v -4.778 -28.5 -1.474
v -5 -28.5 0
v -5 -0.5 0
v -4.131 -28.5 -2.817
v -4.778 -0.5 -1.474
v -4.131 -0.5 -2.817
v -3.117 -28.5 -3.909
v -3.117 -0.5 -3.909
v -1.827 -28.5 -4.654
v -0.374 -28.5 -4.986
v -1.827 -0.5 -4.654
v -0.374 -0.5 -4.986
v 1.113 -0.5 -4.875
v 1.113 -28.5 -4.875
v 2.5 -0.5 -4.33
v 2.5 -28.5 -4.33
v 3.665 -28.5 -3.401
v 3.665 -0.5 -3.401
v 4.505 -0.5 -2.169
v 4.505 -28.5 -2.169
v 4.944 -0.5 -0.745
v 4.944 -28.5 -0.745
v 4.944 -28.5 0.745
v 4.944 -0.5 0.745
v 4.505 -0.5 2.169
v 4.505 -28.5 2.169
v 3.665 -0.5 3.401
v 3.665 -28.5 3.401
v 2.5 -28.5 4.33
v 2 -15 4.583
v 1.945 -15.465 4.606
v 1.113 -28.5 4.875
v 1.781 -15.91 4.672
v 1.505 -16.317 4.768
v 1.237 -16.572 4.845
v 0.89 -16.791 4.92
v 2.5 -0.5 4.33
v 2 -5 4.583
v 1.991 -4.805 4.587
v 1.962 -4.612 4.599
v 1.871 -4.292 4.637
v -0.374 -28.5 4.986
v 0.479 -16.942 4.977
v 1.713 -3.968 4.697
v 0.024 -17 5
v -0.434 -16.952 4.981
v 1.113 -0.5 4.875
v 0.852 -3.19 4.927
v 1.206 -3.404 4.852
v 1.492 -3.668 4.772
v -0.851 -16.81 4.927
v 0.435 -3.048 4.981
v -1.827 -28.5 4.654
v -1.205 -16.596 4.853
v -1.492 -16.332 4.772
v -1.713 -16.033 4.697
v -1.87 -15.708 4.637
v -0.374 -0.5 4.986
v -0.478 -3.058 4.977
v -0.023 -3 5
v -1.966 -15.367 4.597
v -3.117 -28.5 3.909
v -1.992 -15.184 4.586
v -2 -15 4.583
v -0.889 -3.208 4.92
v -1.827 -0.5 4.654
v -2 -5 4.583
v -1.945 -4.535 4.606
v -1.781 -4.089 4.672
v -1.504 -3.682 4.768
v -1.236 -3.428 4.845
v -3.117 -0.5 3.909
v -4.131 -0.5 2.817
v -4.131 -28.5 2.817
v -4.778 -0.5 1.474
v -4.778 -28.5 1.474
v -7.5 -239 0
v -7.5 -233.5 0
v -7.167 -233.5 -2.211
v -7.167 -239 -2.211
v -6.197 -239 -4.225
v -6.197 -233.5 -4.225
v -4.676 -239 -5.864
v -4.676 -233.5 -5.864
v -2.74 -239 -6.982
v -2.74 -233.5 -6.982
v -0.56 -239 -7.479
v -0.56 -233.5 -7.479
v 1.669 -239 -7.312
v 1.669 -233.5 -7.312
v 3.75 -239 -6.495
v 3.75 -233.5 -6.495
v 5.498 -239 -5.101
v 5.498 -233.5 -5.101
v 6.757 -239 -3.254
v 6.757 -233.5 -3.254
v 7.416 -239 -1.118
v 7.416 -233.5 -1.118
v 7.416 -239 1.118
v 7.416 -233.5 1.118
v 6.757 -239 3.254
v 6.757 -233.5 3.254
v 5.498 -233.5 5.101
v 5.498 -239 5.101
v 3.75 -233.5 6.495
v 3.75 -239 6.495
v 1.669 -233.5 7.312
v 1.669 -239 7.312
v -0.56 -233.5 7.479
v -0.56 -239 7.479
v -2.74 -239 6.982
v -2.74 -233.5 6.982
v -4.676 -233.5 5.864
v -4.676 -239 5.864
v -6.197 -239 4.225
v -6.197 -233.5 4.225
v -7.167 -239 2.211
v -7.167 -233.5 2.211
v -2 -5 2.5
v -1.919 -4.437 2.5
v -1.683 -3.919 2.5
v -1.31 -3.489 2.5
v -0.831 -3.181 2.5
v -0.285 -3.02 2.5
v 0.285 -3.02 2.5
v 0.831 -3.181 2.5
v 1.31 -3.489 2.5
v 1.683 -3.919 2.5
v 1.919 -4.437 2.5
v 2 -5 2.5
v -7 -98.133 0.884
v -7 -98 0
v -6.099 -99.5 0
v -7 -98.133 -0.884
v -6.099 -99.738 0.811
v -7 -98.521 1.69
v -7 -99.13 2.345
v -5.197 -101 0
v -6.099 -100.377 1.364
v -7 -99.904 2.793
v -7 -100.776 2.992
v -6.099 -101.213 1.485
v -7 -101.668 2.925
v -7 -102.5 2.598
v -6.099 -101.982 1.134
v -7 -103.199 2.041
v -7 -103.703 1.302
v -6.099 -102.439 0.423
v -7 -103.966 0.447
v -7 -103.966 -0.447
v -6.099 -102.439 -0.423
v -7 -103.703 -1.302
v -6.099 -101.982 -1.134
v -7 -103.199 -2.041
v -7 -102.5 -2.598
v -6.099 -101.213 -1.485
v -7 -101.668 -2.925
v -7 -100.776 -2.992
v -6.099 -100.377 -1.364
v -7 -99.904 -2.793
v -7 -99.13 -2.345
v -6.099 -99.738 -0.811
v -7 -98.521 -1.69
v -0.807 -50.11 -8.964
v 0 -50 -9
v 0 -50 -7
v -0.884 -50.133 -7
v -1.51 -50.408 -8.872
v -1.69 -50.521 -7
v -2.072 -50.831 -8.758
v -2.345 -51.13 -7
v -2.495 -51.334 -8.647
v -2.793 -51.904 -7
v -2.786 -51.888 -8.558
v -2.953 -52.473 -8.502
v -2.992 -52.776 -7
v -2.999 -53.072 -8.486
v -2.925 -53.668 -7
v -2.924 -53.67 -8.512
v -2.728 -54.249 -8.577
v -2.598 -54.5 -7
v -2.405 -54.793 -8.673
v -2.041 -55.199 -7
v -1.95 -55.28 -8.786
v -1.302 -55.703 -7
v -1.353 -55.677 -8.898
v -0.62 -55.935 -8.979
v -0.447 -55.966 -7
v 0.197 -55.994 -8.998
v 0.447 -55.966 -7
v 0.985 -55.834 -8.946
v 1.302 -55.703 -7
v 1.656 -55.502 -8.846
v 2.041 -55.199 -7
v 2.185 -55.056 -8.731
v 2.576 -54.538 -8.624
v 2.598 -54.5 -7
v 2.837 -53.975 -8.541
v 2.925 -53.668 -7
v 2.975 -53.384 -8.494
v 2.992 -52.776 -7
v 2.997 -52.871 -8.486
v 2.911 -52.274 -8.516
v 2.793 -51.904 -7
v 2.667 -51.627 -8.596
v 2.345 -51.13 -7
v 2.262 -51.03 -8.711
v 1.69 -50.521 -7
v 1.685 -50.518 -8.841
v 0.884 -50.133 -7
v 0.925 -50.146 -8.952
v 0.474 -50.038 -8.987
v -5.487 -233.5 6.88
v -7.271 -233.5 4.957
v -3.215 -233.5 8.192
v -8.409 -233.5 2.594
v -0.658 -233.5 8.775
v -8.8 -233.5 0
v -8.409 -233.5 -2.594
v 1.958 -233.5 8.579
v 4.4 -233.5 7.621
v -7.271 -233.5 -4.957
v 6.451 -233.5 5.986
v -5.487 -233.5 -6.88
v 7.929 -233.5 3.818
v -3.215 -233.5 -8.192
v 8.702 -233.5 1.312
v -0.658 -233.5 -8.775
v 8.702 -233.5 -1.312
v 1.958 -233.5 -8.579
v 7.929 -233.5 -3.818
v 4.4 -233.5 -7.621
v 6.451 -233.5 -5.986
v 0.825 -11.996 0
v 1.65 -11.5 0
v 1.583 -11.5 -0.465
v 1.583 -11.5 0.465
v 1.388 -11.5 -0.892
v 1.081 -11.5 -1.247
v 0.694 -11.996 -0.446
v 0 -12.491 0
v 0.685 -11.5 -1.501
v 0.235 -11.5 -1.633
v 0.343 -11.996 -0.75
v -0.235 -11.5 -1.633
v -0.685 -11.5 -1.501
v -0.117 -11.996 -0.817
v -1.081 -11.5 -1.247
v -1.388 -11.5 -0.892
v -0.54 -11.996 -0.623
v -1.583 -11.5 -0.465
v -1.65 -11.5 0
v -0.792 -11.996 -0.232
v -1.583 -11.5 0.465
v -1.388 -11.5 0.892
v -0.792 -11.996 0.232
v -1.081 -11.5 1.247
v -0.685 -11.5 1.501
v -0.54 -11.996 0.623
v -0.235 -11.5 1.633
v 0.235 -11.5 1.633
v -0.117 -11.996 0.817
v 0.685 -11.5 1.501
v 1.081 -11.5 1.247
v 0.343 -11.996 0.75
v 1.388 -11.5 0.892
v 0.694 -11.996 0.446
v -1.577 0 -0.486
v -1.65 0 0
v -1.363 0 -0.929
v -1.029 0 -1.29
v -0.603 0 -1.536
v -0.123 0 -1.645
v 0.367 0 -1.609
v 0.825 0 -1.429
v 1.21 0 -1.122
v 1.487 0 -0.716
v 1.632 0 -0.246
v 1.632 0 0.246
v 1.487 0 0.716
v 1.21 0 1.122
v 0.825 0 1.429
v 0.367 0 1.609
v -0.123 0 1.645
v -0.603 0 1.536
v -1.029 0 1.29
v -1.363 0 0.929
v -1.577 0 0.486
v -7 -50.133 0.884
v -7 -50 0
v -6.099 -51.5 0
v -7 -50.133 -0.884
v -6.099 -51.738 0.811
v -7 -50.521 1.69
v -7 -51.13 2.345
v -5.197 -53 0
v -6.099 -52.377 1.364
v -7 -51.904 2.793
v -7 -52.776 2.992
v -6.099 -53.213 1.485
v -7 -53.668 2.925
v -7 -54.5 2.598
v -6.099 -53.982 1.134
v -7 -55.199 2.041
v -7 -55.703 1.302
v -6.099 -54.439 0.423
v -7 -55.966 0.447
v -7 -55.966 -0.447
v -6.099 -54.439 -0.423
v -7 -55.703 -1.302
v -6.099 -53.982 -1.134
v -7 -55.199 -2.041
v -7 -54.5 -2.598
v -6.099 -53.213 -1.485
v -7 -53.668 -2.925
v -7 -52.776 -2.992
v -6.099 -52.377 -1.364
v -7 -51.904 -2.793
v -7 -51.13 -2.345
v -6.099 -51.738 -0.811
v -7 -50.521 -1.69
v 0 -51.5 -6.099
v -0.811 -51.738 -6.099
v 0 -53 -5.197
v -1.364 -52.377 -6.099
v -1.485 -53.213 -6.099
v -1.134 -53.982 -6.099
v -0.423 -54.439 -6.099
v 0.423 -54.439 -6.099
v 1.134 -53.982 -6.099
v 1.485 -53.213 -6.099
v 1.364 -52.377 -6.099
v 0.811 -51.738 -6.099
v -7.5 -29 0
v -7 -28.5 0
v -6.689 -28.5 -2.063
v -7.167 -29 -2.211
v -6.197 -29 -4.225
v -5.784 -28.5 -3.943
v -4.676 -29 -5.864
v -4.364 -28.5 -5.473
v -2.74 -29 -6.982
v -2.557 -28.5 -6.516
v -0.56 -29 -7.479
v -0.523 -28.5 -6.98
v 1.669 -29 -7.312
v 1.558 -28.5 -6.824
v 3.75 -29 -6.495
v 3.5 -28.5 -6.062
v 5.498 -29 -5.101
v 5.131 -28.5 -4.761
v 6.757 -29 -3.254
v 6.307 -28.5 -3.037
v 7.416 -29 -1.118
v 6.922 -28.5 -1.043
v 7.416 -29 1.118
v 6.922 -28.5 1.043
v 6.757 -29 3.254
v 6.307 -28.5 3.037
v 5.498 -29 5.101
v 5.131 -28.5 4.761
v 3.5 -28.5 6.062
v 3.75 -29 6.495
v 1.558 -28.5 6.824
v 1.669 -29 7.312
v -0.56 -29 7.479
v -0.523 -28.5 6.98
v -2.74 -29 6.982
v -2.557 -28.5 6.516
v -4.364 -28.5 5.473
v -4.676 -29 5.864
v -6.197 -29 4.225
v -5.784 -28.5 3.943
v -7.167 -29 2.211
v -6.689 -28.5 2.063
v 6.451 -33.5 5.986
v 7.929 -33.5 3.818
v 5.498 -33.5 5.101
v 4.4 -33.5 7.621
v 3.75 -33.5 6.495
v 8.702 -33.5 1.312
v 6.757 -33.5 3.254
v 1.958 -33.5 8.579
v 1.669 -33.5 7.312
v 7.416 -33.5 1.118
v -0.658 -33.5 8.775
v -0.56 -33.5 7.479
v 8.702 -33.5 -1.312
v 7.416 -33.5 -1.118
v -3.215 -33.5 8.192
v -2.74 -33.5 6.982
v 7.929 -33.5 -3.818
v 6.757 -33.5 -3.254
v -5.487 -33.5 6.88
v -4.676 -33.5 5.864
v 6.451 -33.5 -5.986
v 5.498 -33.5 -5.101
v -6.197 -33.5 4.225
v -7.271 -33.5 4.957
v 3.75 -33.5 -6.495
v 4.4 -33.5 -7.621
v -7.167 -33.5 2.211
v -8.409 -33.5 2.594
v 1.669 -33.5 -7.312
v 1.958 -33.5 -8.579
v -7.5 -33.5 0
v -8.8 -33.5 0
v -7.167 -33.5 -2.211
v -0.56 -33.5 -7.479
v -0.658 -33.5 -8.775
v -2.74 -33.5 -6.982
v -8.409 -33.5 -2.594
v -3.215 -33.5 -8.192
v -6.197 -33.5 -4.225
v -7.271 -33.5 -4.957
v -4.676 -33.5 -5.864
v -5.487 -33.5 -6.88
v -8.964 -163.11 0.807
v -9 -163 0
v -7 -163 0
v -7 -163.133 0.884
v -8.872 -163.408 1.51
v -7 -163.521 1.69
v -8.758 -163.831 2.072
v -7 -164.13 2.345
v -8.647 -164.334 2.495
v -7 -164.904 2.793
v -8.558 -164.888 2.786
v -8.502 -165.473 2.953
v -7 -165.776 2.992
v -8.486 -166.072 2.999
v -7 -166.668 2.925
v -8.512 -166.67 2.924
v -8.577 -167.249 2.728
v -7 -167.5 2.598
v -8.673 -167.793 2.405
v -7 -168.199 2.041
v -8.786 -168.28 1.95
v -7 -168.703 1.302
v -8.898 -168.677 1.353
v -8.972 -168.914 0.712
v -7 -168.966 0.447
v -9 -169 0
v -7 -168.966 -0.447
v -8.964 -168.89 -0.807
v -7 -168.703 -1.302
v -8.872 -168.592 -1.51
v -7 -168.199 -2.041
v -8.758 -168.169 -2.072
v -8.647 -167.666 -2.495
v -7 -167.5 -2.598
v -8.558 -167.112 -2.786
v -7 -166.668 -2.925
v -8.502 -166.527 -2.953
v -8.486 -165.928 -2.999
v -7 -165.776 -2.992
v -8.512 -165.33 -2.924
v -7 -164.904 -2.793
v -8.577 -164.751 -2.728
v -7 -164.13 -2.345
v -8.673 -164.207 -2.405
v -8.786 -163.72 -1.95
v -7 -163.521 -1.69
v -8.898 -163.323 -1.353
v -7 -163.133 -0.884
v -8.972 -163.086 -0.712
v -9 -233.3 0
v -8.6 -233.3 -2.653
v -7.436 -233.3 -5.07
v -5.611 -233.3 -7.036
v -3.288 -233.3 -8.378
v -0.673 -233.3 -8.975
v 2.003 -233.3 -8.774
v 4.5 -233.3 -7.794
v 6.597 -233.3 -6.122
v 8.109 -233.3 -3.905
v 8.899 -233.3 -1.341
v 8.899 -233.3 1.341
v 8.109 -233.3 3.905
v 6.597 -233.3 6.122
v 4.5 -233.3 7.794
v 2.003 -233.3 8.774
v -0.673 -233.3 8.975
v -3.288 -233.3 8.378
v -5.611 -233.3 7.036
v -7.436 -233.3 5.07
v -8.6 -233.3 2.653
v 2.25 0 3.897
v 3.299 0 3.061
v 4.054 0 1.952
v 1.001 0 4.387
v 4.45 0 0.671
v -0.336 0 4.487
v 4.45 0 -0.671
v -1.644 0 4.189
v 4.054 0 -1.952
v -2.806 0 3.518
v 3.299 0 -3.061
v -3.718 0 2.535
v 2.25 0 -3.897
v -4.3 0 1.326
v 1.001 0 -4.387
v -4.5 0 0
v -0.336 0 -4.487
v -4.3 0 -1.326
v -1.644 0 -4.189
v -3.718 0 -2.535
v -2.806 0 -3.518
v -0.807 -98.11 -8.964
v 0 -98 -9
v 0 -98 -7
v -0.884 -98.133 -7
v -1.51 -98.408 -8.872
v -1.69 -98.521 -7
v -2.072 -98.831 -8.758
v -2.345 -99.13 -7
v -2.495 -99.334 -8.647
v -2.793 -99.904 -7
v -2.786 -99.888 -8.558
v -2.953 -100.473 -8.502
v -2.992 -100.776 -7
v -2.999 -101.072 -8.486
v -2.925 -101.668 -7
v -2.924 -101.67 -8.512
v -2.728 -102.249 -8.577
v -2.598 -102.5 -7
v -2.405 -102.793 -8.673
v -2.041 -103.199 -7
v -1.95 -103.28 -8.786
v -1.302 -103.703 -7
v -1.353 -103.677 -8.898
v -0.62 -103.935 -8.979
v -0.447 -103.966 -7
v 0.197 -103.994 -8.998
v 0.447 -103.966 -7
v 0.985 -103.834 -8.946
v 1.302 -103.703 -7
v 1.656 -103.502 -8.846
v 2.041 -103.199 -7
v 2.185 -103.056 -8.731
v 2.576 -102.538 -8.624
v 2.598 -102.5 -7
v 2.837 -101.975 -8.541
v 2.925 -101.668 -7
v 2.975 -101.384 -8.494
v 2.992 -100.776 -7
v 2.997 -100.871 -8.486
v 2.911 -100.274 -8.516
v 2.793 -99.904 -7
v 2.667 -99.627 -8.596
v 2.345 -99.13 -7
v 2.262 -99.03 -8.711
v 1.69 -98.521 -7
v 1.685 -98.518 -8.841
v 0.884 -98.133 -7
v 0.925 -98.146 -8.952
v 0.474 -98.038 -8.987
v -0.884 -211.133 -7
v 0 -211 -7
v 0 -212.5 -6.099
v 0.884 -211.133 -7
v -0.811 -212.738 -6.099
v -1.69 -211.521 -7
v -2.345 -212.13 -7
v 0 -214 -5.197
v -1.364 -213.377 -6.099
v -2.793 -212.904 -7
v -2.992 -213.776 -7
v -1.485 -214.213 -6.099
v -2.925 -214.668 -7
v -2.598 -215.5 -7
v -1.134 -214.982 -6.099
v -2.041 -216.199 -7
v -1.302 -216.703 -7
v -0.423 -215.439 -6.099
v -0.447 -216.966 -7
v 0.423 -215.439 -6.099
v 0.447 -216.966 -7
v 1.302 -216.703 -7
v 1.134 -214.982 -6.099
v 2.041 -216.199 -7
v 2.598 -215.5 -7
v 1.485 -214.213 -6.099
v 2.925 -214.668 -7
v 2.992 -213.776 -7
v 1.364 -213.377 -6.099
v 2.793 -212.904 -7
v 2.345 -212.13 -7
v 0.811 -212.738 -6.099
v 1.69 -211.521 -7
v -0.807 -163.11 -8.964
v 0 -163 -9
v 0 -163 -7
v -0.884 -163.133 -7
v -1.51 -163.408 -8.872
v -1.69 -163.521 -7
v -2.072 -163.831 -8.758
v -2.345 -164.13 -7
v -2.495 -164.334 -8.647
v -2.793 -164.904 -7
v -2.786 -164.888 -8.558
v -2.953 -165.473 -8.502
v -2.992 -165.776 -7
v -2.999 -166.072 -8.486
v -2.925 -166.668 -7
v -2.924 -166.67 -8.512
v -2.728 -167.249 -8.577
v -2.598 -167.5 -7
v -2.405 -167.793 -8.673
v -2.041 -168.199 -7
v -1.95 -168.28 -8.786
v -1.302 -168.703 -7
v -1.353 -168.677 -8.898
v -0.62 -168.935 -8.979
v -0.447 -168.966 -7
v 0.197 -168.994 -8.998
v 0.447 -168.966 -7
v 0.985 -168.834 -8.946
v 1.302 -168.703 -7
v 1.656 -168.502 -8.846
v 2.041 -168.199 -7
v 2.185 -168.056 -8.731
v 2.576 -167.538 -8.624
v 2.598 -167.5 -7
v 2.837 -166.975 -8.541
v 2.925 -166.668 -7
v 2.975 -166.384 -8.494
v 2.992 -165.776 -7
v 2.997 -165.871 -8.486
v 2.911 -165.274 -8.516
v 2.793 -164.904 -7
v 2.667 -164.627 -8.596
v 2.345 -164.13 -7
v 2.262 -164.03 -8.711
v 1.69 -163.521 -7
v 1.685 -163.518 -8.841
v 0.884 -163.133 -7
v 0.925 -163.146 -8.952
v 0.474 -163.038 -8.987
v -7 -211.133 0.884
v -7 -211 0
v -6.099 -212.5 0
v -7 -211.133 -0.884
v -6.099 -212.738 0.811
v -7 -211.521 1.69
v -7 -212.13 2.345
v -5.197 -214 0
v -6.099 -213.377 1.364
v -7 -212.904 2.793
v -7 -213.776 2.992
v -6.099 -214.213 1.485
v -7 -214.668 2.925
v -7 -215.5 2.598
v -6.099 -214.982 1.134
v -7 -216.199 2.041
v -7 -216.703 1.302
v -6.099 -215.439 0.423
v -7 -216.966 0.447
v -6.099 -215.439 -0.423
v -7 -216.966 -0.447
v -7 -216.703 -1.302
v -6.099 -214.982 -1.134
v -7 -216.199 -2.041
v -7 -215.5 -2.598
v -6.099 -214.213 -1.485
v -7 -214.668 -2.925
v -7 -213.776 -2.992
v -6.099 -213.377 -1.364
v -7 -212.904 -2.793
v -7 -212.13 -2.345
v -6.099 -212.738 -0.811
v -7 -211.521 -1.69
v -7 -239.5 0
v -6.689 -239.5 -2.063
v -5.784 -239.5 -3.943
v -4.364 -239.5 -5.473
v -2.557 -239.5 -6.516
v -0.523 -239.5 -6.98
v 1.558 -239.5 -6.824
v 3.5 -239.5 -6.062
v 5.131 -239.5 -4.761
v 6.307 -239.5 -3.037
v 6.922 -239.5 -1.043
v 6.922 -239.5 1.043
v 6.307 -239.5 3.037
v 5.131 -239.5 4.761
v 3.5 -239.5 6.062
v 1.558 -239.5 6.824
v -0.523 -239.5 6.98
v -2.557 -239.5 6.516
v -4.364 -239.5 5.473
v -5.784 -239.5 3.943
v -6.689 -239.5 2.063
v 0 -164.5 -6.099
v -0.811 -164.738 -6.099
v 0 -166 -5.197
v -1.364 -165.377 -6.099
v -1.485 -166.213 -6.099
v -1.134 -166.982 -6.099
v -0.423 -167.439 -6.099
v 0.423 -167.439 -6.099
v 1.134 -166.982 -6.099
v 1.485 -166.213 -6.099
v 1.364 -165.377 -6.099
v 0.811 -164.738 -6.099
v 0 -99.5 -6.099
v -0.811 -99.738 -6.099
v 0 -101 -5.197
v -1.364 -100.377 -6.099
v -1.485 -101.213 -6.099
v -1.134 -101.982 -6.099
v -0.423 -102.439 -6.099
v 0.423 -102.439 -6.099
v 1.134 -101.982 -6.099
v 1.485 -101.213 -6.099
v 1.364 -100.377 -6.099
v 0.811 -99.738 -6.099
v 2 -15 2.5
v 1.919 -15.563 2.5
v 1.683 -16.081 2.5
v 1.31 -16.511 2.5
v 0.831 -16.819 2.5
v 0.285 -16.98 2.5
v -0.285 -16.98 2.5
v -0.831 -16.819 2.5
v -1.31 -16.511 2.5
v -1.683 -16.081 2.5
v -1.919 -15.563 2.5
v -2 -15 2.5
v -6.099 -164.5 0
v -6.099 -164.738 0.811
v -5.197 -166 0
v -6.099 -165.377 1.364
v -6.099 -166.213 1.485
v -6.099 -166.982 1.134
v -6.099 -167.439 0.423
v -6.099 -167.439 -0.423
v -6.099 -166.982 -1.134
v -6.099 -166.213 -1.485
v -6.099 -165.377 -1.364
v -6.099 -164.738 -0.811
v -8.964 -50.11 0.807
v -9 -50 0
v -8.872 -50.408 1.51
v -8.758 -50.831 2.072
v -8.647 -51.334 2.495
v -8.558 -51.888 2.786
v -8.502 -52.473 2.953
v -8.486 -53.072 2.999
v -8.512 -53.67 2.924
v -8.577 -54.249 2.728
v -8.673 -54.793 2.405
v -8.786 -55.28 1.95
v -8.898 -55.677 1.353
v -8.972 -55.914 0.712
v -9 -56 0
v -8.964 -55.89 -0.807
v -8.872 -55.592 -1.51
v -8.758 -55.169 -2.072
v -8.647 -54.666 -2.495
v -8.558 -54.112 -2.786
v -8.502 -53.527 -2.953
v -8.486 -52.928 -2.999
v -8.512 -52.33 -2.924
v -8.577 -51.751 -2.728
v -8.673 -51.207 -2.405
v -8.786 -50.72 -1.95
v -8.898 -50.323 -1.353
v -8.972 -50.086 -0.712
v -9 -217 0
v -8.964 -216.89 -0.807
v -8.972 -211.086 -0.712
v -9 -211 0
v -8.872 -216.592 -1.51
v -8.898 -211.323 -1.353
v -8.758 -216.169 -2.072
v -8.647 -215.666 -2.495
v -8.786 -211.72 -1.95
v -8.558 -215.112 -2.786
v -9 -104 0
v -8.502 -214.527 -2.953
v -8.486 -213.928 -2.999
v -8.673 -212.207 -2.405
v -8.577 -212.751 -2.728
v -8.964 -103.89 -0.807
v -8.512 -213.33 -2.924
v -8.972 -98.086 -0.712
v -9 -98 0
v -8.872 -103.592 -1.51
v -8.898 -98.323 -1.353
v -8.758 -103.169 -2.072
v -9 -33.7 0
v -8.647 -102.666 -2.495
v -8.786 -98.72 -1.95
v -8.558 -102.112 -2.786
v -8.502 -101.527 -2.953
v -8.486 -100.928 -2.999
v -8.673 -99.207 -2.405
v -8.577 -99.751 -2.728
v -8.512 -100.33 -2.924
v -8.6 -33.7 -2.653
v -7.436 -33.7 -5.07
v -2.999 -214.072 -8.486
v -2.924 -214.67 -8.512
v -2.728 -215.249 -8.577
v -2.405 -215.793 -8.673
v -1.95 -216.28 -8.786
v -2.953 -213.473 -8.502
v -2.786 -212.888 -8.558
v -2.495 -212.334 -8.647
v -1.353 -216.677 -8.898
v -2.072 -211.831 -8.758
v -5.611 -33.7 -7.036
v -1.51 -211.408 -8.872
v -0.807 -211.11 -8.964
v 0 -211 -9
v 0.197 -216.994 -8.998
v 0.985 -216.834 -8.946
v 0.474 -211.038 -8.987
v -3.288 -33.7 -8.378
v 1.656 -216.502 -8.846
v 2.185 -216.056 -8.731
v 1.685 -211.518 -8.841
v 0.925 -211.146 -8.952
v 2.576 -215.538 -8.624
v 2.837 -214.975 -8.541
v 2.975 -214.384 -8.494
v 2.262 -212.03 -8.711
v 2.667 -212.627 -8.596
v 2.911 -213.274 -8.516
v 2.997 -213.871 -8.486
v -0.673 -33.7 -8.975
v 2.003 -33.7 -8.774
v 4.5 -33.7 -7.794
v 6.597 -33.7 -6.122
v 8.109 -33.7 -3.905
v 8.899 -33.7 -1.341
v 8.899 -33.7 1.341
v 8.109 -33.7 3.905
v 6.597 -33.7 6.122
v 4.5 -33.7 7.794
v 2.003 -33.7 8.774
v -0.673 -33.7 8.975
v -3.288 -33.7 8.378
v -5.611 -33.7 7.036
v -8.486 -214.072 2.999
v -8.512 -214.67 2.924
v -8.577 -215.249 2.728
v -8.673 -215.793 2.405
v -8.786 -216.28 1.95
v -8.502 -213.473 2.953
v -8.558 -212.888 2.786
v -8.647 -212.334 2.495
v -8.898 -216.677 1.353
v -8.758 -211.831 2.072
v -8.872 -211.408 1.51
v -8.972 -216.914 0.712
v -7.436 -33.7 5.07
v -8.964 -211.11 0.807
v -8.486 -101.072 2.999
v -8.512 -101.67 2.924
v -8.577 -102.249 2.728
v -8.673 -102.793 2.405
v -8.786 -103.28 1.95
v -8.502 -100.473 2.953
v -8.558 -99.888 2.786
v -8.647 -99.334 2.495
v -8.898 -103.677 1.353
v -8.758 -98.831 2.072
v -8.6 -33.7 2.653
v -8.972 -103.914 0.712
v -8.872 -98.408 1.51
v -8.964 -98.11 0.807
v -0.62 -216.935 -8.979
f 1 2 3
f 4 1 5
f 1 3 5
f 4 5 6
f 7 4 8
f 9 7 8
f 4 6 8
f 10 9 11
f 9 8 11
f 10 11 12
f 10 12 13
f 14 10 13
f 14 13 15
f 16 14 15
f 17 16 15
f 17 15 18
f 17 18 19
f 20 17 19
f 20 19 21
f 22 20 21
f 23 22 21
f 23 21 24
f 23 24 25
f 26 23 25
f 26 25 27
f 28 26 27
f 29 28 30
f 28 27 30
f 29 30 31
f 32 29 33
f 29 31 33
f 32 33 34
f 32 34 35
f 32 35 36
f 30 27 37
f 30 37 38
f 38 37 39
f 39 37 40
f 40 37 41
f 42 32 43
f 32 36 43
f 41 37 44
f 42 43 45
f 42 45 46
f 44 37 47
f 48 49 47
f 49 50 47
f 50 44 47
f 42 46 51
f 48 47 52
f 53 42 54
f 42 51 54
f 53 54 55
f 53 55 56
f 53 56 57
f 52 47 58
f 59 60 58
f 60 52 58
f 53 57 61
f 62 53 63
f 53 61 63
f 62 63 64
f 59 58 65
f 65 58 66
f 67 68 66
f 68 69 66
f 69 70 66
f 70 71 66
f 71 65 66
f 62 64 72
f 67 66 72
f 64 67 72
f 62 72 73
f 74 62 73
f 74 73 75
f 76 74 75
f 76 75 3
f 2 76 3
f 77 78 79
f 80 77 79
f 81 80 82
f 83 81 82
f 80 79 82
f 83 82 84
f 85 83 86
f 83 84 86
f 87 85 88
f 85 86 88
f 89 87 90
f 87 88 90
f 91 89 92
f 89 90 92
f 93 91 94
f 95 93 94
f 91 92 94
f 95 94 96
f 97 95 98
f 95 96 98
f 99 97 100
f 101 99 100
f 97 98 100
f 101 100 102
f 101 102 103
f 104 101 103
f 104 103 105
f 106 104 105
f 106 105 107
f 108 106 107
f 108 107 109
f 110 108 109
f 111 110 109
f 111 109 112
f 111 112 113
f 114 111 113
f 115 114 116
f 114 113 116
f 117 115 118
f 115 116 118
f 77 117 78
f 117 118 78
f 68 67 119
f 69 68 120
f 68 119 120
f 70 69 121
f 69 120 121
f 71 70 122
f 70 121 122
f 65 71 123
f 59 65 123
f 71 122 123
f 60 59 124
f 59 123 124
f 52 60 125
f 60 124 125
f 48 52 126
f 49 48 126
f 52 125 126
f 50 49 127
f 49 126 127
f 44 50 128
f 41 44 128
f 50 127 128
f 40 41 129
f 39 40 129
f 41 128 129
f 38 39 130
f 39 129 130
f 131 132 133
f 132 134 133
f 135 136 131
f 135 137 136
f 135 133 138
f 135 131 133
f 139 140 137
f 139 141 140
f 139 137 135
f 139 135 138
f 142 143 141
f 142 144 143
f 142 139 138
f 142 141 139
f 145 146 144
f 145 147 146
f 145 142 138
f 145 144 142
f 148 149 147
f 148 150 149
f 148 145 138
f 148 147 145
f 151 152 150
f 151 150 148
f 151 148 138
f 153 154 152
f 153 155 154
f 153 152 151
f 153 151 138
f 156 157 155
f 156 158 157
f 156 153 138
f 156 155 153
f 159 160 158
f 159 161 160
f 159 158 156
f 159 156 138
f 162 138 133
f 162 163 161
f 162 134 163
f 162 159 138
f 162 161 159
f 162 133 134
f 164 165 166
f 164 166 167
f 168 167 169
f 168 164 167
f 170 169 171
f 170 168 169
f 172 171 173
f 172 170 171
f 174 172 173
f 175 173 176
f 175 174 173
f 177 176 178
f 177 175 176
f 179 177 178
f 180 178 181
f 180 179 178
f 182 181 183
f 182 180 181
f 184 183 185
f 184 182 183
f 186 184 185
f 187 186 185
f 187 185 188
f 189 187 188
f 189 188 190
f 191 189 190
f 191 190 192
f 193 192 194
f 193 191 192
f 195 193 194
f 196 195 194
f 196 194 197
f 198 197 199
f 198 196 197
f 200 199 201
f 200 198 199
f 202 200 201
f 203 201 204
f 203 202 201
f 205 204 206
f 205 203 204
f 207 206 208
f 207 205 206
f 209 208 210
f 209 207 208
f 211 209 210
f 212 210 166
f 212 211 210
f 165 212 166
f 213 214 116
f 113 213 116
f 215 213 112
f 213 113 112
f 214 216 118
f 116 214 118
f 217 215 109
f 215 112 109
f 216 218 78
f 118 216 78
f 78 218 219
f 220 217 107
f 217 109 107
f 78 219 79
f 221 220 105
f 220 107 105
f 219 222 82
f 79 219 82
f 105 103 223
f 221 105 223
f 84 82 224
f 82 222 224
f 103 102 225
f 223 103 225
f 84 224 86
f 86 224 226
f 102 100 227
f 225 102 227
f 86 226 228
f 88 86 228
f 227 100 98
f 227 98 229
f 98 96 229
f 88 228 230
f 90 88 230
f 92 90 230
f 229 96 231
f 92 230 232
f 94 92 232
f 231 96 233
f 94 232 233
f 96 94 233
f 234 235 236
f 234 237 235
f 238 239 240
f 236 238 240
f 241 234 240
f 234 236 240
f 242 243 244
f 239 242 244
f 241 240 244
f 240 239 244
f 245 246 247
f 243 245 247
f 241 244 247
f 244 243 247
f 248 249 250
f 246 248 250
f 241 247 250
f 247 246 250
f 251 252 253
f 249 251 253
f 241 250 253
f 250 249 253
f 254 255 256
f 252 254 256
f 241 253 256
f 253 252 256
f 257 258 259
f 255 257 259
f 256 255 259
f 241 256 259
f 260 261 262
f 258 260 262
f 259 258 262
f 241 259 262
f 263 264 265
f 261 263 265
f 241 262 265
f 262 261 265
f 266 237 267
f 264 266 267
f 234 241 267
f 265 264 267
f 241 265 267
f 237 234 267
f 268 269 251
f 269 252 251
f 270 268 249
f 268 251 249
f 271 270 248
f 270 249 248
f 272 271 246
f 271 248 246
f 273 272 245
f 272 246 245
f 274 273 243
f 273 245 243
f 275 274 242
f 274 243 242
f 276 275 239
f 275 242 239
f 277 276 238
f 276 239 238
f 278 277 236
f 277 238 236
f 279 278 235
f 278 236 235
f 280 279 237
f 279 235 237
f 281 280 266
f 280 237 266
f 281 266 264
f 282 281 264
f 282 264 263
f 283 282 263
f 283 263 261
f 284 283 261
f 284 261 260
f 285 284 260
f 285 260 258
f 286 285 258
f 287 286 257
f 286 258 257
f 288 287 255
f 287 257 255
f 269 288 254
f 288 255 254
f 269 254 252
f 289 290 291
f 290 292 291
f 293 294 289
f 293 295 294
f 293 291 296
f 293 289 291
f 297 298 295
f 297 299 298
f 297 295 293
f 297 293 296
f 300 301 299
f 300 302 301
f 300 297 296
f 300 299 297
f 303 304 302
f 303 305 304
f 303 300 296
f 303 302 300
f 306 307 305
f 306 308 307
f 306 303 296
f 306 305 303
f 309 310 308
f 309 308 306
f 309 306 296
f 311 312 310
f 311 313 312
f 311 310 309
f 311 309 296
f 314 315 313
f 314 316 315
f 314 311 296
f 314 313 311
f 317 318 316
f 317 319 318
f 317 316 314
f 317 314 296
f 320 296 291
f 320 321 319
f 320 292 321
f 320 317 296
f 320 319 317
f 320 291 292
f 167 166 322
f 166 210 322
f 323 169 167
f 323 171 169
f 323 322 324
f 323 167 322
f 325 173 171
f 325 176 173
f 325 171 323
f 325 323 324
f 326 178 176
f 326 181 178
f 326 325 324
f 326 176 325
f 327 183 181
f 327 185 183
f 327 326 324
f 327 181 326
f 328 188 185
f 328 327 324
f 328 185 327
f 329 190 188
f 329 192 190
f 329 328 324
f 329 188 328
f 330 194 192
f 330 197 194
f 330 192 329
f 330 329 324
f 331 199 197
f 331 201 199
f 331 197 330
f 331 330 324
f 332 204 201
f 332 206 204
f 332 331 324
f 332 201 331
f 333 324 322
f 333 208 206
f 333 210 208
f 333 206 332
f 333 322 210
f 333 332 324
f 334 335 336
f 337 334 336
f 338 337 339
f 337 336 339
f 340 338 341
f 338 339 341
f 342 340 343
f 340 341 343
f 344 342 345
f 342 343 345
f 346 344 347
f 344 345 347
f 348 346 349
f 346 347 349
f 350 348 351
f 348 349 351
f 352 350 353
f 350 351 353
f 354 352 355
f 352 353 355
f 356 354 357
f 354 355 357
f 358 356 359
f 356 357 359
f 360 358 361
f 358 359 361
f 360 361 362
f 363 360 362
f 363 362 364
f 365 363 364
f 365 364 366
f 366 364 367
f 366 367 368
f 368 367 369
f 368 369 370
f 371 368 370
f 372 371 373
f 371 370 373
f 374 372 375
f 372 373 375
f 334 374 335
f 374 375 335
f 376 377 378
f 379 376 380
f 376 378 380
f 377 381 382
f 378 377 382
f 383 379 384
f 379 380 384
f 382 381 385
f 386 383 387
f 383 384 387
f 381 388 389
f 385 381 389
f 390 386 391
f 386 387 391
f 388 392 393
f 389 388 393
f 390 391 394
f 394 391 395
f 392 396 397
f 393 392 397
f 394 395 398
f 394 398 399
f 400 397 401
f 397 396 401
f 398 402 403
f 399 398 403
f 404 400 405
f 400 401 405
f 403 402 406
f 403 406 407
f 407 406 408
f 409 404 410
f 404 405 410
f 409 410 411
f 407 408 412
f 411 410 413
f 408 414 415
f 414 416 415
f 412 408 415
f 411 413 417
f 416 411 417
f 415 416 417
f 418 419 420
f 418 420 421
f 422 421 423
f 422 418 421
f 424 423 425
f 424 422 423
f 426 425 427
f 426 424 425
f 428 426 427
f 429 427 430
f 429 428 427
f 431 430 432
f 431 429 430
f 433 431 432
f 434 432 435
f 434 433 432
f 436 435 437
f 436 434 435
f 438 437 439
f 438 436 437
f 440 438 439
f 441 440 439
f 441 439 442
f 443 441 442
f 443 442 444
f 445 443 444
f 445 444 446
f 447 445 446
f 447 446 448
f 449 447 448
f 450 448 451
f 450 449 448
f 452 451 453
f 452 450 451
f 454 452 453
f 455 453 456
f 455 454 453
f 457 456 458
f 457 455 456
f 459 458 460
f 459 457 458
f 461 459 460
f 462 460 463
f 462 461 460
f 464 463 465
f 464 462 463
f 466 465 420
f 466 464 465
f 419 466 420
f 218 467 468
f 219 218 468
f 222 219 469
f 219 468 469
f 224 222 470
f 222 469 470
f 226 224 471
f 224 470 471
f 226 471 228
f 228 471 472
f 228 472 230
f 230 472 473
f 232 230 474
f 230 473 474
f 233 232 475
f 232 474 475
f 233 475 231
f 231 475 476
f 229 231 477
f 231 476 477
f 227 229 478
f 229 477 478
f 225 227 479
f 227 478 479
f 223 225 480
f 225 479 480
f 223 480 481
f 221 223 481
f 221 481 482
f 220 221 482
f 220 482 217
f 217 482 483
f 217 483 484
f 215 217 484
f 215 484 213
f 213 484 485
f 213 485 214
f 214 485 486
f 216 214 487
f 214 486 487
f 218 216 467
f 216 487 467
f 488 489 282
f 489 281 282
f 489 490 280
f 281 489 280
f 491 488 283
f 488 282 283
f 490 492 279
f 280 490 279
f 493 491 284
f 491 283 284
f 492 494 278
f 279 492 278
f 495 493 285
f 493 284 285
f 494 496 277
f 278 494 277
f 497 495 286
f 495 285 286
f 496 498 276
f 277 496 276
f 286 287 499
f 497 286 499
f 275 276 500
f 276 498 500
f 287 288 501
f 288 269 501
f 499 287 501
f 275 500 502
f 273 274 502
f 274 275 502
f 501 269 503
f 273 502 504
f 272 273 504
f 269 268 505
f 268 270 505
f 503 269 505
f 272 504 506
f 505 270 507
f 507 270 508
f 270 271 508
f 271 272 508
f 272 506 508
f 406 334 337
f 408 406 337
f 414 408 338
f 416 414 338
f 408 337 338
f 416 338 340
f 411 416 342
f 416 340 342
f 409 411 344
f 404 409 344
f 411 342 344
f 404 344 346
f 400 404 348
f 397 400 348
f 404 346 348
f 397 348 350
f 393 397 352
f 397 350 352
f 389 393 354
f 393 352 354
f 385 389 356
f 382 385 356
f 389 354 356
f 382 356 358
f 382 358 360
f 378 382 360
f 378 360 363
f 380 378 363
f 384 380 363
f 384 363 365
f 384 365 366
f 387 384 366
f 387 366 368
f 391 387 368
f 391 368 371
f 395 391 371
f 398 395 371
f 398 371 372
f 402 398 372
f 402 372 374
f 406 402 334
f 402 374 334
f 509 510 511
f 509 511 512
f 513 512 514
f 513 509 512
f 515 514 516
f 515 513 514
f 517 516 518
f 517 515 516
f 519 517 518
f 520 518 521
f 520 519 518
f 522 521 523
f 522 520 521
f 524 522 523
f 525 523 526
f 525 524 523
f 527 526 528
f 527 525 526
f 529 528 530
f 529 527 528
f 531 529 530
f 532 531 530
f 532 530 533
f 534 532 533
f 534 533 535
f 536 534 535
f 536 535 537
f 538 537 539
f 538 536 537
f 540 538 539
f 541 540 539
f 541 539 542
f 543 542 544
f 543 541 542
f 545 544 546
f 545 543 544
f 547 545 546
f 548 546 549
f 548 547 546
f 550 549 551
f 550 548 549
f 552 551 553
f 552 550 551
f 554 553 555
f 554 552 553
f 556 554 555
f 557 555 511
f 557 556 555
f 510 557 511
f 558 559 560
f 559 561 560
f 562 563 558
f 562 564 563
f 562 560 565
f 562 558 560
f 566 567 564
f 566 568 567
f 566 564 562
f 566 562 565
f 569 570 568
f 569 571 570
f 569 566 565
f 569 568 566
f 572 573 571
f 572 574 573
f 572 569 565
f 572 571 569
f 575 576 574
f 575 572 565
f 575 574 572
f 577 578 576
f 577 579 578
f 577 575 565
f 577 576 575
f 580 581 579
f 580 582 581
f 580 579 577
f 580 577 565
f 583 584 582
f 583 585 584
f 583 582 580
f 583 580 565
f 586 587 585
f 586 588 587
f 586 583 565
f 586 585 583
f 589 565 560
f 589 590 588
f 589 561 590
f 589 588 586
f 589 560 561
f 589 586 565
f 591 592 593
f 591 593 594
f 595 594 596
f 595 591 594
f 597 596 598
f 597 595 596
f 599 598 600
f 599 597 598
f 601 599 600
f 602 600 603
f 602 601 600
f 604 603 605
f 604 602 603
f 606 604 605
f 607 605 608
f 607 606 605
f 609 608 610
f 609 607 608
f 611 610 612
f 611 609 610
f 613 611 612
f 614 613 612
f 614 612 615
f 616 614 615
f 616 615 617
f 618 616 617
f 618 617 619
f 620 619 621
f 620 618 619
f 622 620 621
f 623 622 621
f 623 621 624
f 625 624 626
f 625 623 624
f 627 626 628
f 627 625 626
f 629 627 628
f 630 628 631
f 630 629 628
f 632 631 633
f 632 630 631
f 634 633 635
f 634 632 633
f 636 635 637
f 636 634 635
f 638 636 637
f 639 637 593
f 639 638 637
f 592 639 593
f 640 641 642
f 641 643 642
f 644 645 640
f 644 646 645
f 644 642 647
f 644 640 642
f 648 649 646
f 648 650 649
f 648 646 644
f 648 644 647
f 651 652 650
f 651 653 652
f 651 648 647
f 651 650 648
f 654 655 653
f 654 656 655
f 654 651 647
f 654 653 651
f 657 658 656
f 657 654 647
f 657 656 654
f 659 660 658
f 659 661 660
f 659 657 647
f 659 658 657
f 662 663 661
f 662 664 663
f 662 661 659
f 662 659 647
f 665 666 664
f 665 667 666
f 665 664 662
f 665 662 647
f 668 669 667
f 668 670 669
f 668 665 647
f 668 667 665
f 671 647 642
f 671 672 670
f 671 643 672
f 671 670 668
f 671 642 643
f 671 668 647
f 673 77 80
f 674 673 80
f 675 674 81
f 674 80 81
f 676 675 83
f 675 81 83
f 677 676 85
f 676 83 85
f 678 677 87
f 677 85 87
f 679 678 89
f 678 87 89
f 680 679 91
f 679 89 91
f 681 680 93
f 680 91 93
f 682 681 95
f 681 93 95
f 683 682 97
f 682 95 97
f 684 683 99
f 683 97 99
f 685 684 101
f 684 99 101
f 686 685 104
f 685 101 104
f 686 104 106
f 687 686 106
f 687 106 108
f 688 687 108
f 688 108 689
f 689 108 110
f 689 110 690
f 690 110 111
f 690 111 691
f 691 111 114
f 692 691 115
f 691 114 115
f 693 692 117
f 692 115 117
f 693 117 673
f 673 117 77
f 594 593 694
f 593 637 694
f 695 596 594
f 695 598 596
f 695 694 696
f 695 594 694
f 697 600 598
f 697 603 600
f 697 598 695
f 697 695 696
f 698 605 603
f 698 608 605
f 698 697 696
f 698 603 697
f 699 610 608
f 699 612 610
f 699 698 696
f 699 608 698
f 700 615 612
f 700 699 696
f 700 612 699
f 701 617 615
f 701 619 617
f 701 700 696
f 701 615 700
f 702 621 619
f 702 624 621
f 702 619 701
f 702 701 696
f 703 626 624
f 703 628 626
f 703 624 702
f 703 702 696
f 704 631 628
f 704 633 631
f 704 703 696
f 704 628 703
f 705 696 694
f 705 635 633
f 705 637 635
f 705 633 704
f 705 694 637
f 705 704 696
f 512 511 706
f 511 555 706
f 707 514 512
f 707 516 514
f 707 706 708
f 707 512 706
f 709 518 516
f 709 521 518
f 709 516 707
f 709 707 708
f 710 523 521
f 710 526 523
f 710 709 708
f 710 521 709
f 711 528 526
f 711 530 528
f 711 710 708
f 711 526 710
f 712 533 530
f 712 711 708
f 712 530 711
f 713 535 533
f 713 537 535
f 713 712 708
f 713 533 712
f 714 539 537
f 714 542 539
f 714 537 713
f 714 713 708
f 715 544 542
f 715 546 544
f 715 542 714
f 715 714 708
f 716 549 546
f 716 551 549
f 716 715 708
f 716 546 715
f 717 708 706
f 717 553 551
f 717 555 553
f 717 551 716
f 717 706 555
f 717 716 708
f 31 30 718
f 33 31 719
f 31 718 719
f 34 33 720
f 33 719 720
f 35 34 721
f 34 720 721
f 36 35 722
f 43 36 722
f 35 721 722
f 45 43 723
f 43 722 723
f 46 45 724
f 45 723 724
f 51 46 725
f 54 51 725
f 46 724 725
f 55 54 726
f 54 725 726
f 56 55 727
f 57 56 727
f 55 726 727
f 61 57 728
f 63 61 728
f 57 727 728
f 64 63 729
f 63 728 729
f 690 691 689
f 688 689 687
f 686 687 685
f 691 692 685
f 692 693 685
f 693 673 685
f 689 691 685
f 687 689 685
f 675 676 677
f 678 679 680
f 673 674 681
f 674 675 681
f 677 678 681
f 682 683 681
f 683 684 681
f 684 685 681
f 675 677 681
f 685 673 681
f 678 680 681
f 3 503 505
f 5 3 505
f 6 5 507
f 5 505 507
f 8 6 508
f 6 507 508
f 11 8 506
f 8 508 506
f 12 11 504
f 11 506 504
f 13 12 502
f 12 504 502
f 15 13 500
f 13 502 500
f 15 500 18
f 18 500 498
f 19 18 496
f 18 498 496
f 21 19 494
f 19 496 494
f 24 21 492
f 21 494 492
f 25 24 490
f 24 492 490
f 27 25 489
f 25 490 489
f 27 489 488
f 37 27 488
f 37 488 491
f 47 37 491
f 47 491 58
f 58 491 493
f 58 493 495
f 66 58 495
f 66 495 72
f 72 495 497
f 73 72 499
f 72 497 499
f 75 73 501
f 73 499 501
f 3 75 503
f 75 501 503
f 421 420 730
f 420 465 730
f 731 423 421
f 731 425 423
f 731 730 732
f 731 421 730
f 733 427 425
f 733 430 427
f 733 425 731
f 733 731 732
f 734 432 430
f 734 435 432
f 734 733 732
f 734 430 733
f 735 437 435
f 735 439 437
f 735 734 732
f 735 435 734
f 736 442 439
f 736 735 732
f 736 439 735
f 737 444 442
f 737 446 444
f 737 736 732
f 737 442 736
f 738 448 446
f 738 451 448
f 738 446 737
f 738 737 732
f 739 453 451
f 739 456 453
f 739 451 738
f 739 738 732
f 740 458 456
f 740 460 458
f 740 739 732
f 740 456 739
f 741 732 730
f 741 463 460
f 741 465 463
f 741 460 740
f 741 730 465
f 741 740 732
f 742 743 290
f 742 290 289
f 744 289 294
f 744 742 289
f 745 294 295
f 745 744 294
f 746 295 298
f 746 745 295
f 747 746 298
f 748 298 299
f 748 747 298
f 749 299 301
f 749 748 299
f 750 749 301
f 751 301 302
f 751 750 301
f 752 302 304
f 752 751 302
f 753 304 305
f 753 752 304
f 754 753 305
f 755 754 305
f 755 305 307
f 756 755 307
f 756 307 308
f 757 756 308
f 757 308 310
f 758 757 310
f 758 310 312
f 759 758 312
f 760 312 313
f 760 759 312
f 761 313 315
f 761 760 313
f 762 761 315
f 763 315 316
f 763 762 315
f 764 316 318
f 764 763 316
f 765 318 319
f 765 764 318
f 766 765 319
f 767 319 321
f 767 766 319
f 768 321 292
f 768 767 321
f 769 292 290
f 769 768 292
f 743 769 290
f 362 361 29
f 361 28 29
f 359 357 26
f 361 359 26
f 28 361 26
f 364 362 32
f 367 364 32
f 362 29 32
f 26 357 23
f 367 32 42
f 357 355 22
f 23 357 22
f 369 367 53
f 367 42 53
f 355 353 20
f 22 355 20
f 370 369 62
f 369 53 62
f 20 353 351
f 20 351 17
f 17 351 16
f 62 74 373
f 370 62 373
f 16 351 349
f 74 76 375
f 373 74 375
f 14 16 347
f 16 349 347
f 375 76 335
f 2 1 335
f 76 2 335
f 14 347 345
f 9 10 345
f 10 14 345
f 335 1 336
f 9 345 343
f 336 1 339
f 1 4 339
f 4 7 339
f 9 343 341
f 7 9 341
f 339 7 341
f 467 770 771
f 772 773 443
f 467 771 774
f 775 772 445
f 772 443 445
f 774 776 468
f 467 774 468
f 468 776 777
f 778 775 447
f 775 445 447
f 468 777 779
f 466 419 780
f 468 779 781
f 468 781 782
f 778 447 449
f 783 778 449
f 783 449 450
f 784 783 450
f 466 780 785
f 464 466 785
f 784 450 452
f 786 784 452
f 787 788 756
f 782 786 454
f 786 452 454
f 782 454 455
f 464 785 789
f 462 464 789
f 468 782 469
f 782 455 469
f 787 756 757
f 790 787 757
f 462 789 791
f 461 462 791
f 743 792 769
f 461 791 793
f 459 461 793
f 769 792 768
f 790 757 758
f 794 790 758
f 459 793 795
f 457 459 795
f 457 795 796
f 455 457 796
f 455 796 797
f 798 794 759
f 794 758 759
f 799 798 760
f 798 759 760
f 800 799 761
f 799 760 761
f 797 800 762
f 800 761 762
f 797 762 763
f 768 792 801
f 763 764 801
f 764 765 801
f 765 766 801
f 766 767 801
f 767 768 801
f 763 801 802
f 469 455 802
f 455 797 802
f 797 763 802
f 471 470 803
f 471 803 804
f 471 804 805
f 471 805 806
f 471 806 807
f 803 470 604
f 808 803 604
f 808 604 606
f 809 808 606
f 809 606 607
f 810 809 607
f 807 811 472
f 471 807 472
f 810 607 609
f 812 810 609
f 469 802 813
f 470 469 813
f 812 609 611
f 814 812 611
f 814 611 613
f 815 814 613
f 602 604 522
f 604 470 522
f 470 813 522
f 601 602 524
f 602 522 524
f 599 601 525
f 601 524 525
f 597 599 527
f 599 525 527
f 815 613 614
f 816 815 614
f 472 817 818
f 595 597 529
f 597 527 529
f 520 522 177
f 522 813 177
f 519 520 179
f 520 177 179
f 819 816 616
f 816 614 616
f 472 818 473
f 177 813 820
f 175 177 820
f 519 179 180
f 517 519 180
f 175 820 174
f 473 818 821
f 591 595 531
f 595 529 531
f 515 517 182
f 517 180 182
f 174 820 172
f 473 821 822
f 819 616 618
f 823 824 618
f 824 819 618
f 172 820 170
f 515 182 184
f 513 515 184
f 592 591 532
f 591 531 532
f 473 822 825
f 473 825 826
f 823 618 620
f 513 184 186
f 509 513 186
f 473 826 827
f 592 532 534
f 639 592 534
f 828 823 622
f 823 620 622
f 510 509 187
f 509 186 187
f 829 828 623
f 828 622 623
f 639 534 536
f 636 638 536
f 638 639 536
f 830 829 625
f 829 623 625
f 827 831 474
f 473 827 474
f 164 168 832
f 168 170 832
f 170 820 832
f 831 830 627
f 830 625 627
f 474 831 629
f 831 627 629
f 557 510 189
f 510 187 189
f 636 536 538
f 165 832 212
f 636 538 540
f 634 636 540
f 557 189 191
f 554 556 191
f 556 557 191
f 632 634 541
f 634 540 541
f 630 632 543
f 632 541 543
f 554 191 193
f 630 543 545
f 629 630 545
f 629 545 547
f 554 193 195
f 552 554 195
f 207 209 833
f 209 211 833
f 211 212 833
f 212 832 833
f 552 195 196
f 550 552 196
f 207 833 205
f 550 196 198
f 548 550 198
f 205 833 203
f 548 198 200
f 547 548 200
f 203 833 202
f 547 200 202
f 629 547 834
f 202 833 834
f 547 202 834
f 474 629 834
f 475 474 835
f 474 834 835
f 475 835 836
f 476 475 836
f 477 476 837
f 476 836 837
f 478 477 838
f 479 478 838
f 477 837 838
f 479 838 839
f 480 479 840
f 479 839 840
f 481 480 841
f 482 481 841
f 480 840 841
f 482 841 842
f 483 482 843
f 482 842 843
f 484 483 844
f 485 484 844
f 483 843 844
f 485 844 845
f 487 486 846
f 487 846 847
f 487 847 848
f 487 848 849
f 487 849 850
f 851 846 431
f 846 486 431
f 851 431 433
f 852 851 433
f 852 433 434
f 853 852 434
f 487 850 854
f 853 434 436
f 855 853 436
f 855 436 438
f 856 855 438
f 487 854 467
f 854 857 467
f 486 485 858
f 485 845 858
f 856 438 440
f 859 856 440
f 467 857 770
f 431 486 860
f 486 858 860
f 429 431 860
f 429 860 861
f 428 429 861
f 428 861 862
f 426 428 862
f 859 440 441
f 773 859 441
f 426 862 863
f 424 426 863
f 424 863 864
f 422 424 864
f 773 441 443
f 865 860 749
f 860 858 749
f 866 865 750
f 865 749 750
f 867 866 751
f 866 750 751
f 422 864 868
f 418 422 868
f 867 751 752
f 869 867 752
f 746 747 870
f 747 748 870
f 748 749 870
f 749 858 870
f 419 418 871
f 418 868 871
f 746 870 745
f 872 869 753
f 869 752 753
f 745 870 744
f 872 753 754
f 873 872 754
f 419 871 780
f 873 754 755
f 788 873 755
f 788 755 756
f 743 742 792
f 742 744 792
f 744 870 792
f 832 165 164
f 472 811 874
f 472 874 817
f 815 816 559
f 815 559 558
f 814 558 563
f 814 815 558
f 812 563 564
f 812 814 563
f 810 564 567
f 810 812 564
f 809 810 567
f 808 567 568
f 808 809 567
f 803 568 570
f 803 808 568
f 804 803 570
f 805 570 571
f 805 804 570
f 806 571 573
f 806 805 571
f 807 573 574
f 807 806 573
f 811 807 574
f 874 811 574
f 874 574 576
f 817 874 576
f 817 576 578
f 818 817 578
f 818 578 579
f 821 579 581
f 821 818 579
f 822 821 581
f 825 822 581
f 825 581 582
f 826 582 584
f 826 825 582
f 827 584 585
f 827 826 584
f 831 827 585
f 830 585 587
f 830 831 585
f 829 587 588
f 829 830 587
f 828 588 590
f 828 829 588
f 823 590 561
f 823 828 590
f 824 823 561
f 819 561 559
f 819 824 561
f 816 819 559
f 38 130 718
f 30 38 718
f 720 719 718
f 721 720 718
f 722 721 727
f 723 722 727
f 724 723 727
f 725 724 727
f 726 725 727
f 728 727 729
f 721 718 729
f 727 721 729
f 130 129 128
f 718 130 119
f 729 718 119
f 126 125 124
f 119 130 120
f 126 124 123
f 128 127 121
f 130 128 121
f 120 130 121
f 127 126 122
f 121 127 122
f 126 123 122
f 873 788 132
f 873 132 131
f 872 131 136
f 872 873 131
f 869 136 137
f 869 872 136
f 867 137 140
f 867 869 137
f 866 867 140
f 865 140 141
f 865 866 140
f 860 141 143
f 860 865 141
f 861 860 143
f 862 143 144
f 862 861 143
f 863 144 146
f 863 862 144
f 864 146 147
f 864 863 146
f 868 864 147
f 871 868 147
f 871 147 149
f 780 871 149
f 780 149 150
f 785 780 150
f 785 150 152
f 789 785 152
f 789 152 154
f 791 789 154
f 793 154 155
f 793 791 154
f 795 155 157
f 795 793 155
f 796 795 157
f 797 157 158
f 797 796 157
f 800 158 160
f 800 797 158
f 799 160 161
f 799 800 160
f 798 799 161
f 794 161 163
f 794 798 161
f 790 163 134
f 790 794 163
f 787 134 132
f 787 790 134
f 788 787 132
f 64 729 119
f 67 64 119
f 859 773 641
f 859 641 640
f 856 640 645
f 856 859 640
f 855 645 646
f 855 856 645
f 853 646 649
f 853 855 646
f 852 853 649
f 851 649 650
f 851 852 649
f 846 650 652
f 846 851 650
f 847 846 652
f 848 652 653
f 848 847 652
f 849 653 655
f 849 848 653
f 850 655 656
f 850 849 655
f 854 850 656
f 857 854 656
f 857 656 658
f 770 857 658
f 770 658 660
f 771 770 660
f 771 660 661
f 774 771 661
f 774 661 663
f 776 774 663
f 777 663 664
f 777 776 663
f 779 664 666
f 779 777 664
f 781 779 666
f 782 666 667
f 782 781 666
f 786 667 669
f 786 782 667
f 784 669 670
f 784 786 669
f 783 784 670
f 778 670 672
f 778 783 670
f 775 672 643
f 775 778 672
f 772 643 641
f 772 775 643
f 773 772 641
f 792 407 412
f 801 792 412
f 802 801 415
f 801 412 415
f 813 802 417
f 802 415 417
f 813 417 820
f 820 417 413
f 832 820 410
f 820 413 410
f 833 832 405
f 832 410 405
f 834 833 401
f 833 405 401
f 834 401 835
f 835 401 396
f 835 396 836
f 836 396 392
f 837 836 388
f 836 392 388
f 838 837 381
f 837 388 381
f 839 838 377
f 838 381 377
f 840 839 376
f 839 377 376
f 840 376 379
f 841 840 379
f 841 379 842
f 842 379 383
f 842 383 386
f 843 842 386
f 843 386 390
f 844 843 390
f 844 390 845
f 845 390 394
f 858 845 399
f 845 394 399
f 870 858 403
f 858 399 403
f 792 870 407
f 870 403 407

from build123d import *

# Parameters (mm, degrees)
CHAMFER_1_SIZE                 = 0.5
CHAMFER_2_SIZE                 = 0.2
HOLE_WIZARD_6_0_6_1_AT_2_COUNT = 2
HOLE_WIZARD_6_0_6_1_AT_2_PITCH = 48
HOLE_WIZARD_6_0_6_1_AT_3_COUNT = 2
HOLE_WIZARD_6_0_6_1_AT_3_PITCH = 113
HOLE_WIZARD_6_0_6_1_AT_4_COUNT = 2
HOLE_WIZARD_6_0_6_1_AT_4_PITCH = 161
PATTERN_CIRCULAR_1_COUNT       = 2
PATTERN_CIRCULAR_1_ANGLE       = 90
CUT_EXTRUDE_3_DEPTH            = 10
HOLE_WIZARD_M4_1_D             = 3.3
HOLE_WIZARD_M4_1_DEPTH         = 11.5
HOLE_WIZARD_M4_1_TIP           = 0.991420021


with BuildPart() as part:
    # 草图1 → 旋转1 (revolve)
    with BuildSketch(Plane.XY):
        Polygon((0, 0), (0, -239.5), (-7.5, -239.5), (-7.5, -233.5), (-9, -233.5), (-9, -33.5), (-7.5, -33.5), (-7.5, -28.5), (-5, -28.5), (-5, 0), align=None)
    revolve(axis=Axis((0, 0, 0), (0, -1, 0)))

    # 倒角1
    chamfer_1_edges = [part.edges().sort_by_distance(p)[0] for p in [
        (7.5, -239.5, 0),
        (5, 0, 0),
        (7.5, -28.5, 0),
    ]]
    chamfer(chamfer_1_edges, length=CHAMFER_1_SIZE)

    # 倒角2
    chamfer_2_edges = [part.edges().sort_by_distance(p)[0] for p in [
        (9, -33.5, 0),
        (9, -233.5, 0),
    ]]
    chamfer(chamfer_2_edges, length=CHAMFER_2_SIZE)

    # 草图5 → Ø6.0 (6) 直径孔1 (revolve, cut)
    with BuildSketch(Plane(origin=(0, -214, -9), x_dir=(0, 1, 0), z_dir=(1, 0, 0))):
        Polygon((0, 0), (0, 3.802581857), (3, 2), (3, 0), align=None)
    hole_wizard_6_0_6_1 = revolve(axis=Axis((0, -214, -15.35), (0, 0, 1)), mode=Mode.SUBTRACT)

    # Ø6.0 (6) 直径孔1 at 2: Ø6.0 (6) 直径孔1 ×2
    with Locations(*[(0, i * HOLE_WIZARD_6_0_6_1_AT_2_PITCH, 0) for i in range(1, HOLE_WIZARD_6_0_6_1_AT_2_COUNT)]):
        add(hole_wizard_6_0_6_1, mode=Mode.SUBTRACT)

    # Ø6.0 (6) 直径孔1 at 3: Ø6.0 (6) 直径孔1 ×2
    with Locations(*[(0, i * HOLE_WIZARD_6_0_6_1_AT_3_PITCH, 0) for i in range(1, HOLE_WIZARD_6_0_6_1_AT_3_COUNT)]):
        add(hole_wizard_6_0_6_1, mode=Mode.SUBTRACT)

    # Ø6.0 (6) 直径孔1 at 4: Ø6.0 (6) 直径孔1 ×2
    with Locations(*[(0, i * HOLE_WIZARD_6_0_6_1_AT_4_PITCH, 0) for i in range(1, HOLE_WIZARD_6_0_6_1_AT_4_COUNT)]):
        add(hole_wizard_6_0_6_1, mode=Mode.SUBTRACT)

    # 阵列(圆周)1: Ø6.0 (6) 直径孔1 ×2 about axis
    pattern_circular_1_axis = Axis((0, 0, 0), (0, 1, 0))
    for i in range(1, PATTERN_CIRCULAR_1_COUNT):
        add(hole_wizard_6_0_6_1.rotate(pattern_circular_1_axis, i * PATTERN_CIRCULAR_1_ANGLE / (PATTERN_CIRCULAR_1_COUNT - 1)), mode=Mode.SUBTRACT)

    # 阵列(圆周)1 copy 1 sketch → 阵列(圆周)1 copy 1 (revolve, cut)
    with BuildSketch(Plane(origin=(-9, -166, 0), x_dir=(0, 1, 0), z_dir=(0, 0, -1))):
        Polygon((0, 0), (0, 3.802581857), (3, 2), (3, 0), align=None)
    revolve(axis=Axis((-15.35, -166, 0), (1, 0, 0)), mode=Mode.SUBTRACT)

    # 阵列(圆周)1 copy 2 sketch → 阵列(圆周)1 copy 2 (revolve, cut)
    with BuildSketch(Plane(origin=(-9, -101, 0), x_dir=(0, 1, 0), z_dir=(0, 0, -1))):
        Polygon((0, 0), (0, 3.802581857), (3, 2), (3, 0), align=None)
    revolve(axis=Axis((-15.35, -101, 0), (1, 0, 0)), mode=Mode.SUBTRACT)

    # 阵列(圆周)1 copy 3 sketch → 阵列(圆周)1 copy 3 (revolve, cut)
    with BuildSketch(Plane(origin=(-9, -53, 0), x_dir=(0, 1, 0), z_dir=(0, 0, -1))):
        Polygon((0, 0), (0, 3.802581857), (3, 2), (3, 0), align=None)
    revolve(axis=Axis((-15.35, -53, 0), (1, 0, 0)), mode=Mode.SUBTRACT)

    # 草图7 → 切除-拉伸3 (cut)
    with BuildSketch(Plane.XY.offset(2.5)):
        with BuildLine():
            Line((2, -5), (2, -15))
            ThreePointArc((2, -15), (0, -17), (-2, -15))
            Line((-2, -15), (-2, -5))
            ThreePointArc((-2, -5), (0, -3), (2, -5))
        make_face()
    extrude(amount=CUT_EXTRUDE_3_DEPTH, mode=Mode.SUBTRACT)

    # M4 螺纹孔1
    with Locations(Plane(origin=(0, 0, 0), x_dir=(1, 0, 0), z_dir=(0, 1, 0))):
        with Locations((0, 0)):
            Hole(HOLE_WIZARD_M4_1_D / 2, depth=HOLE_WIZARD_M4_1_DEPTH)
            with Locations((0, 0, -(HOLE_WIZARD_M4_1_DEPTH + HOLE_WIZARD_M4_1_TIP / 2))):  # 118° drill point
                Cone(0, HOLE_WIZARD_M4_1_D / 2, HOLE_WIZARD_M4_1_TIP, mode=Mode.SUBTRACT)


solid = part.part
